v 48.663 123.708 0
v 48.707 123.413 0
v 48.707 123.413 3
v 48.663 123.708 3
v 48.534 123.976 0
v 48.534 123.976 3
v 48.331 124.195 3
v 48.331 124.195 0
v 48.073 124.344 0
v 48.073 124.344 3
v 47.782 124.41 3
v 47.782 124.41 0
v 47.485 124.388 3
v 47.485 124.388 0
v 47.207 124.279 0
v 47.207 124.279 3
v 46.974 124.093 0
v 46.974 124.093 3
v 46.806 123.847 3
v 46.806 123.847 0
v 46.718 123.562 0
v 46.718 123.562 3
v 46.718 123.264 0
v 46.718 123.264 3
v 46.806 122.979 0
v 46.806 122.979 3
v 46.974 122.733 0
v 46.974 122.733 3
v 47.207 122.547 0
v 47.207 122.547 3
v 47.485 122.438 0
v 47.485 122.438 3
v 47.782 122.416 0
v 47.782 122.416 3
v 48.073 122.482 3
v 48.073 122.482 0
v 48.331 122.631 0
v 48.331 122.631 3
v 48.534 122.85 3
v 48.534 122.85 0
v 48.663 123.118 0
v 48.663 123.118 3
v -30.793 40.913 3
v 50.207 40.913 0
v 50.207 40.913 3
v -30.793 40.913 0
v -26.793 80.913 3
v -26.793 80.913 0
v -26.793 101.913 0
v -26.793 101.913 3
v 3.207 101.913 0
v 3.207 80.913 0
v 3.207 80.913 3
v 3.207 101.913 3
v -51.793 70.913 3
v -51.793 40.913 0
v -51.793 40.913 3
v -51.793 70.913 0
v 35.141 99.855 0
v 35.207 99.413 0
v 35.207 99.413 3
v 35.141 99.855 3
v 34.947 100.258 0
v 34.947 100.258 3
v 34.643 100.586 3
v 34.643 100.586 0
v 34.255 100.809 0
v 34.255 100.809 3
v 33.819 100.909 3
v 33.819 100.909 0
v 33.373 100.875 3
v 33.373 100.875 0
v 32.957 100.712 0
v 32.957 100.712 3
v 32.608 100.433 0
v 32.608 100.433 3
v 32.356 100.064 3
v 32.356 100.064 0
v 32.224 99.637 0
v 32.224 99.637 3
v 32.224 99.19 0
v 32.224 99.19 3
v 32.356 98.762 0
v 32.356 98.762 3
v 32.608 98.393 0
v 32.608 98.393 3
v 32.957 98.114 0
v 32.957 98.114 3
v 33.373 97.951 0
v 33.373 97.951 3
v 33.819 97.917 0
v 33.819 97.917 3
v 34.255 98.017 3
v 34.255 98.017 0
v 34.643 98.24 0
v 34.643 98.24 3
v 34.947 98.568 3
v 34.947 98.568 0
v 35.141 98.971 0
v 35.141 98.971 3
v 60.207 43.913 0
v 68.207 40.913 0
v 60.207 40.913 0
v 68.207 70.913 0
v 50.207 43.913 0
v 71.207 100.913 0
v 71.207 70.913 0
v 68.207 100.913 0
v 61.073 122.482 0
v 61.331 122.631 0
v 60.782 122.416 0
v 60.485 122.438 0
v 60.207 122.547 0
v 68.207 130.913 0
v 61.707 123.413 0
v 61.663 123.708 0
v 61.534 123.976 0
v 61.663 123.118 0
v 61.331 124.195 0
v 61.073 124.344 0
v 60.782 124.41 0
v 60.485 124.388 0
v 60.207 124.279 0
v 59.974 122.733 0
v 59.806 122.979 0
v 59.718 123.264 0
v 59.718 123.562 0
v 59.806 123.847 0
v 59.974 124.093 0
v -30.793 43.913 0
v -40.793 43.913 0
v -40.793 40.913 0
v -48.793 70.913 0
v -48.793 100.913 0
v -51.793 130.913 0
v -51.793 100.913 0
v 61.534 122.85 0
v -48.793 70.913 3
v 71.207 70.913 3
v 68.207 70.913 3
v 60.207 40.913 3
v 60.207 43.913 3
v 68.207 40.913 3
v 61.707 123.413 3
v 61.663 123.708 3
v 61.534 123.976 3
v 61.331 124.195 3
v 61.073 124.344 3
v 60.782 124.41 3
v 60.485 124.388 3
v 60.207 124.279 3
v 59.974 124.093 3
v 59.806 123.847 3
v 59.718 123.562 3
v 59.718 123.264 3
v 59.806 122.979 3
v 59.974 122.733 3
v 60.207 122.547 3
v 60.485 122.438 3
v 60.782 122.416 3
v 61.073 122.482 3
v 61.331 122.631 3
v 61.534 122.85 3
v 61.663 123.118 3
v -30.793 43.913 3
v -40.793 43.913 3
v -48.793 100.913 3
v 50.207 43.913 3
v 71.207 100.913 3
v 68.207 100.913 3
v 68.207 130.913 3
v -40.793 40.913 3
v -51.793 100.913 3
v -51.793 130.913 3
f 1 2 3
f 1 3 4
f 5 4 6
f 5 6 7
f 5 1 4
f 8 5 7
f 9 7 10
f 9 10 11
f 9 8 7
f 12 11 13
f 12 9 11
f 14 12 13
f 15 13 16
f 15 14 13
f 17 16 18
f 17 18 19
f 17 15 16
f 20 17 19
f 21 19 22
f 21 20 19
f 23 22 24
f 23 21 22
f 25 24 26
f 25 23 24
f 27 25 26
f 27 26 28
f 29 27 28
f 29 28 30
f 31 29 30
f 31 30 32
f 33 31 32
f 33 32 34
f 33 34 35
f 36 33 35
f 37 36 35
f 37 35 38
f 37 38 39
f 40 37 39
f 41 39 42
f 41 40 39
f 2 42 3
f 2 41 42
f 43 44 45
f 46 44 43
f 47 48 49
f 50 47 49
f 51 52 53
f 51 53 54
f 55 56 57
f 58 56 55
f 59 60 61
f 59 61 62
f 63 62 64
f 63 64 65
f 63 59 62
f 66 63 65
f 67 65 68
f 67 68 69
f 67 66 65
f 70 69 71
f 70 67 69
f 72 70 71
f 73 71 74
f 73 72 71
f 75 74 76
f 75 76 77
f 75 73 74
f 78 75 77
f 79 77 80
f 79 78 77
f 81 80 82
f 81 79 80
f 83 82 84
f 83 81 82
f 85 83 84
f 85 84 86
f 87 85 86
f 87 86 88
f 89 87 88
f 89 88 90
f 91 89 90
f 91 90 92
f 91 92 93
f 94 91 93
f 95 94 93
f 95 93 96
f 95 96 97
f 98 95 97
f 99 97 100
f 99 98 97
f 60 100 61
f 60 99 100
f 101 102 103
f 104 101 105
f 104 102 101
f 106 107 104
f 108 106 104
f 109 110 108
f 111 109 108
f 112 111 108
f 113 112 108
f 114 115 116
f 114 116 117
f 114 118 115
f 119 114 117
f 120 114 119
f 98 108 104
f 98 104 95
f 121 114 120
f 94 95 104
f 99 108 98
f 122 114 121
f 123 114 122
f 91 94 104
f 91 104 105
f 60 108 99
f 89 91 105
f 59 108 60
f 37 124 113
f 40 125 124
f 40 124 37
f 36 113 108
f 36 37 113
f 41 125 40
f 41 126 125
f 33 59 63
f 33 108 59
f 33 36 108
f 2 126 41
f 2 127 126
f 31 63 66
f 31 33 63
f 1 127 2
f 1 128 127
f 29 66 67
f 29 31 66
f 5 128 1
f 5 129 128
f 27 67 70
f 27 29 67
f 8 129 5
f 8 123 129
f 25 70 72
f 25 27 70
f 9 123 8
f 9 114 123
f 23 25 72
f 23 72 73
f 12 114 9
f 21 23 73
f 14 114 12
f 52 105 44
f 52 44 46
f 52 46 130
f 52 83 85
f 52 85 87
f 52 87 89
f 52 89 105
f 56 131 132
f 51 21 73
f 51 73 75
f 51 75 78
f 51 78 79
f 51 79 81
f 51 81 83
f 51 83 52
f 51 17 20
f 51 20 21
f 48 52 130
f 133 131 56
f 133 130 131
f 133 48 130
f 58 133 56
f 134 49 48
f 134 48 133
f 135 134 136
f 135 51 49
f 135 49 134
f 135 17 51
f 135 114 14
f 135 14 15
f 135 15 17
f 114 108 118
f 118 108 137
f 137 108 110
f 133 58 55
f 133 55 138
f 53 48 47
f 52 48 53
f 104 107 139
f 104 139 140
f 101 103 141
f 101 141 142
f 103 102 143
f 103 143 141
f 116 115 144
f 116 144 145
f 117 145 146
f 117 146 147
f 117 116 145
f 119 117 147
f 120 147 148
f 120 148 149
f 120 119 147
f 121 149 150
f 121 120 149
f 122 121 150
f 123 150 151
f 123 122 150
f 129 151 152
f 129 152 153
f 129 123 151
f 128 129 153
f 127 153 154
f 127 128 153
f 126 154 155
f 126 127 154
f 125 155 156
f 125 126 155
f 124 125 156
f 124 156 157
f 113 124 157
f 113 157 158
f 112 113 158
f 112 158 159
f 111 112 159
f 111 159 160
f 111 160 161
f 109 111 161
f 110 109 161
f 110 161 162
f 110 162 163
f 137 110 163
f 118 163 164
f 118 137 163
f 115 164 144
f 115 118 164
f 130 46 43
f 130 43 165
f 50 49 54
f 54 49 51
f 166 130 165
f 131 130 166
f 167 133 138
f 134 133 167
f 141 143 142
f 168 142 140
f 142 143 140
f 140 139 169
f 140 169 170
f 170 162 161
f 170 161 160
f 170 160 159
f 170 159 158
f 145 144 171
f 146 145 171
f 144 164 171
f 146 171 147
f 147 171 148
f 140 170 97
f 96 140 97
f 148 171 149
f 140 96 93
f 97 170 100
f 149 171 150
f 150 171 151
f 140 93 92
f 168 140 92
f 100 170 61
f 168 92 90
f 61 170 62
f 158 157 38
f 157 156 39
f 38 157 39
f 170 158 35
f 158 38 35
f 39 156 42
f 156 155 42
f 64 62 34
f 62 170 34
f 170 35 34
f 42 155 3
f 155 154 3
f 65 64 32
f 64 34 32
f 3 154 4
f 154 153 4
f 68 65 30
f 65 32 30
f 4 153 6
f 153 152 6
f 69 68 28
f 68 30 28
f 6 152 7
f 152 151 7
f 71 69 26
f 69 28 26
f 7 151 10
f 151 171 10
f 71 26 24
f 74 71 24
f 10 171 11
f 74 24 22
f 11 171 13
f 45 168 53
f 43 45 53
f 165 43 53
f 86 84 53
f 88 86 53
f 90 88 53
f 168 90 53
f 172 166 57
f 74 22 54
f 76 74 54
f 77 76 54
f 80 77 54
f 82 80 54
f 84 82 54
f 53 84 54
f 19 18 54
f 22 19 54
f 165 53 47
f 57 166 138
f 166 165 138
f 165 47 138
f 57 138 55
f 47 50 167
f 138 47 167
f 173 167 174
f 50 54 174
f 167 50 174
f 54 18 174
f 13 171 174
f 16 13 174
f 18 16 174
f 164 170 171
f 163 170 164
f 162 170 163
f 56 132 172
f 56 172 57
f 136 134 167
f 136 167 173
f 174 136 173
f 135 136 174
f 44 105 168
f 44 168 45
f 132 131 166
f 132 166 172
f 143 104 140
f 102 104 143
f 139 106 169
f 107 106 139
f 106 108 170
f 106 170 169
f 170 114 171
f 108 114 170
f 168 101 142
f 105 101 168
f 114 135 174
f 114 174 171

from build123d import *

# Parameters (mm, degrees)
MODEL_R             = 1
MODEL_R_2           = 1.5
MODEL_W             = 30
MODEL_H             = 21
BOSS_EXTRUDE1_DEPTH = 3


with BuildPart() as part:
    # Model → Boss-Extrude1 (new body)
    with BuildSketch(Plane.XY):
        Polygon((71.207281269, 100.913104874), (71.207281269, 70.913104874), (68.207281269, 70.913104874), (68.207281269, 40.913104874), (60.207281269, 40.913104874), (60.207281269, 43.913104874), (50.207281269, 43.913104874), (50.207281269, 40.913104874), (-30.792718731, 40.913104874), (-30.792718731, 43.913104874), (-40.792718731, 43.913104874), (-40.792718731, 40.913104874), (-51.792718731, 40.913104874), (-51.792718731, 70.913104874), (-48.792718731, 70.913104874), (-48.792718731, 100.913104874), (-51.792718731, 100.913104874), (-51.792718731, 130.913104874), (68.207281269, 130.913104874), (68.207281269, 100.913104874), align=None)
        with Locations((47.707281269, 123.413104874)):
            Circle(MODEL_R, mode=Mode.SUBTRACT)
        with Locations((60.707281269, 123.413104874)):
            Circle(MODEL_R, mode=Mode.SUBTRACT)
        with Locations((33.707281269, 99.413104874)):
            Circle(MODEL_R_2, mode=Mode.SUBTRACT)
        with Locations((-11.792718731, 91.413104874)):
            Rectangle(MODEL_W, MODEL_H, mode=Mode.SUBTRACT)
    extrude(amount=BOSS_EXTRUDE1_DEPTH)


solid = part.part
